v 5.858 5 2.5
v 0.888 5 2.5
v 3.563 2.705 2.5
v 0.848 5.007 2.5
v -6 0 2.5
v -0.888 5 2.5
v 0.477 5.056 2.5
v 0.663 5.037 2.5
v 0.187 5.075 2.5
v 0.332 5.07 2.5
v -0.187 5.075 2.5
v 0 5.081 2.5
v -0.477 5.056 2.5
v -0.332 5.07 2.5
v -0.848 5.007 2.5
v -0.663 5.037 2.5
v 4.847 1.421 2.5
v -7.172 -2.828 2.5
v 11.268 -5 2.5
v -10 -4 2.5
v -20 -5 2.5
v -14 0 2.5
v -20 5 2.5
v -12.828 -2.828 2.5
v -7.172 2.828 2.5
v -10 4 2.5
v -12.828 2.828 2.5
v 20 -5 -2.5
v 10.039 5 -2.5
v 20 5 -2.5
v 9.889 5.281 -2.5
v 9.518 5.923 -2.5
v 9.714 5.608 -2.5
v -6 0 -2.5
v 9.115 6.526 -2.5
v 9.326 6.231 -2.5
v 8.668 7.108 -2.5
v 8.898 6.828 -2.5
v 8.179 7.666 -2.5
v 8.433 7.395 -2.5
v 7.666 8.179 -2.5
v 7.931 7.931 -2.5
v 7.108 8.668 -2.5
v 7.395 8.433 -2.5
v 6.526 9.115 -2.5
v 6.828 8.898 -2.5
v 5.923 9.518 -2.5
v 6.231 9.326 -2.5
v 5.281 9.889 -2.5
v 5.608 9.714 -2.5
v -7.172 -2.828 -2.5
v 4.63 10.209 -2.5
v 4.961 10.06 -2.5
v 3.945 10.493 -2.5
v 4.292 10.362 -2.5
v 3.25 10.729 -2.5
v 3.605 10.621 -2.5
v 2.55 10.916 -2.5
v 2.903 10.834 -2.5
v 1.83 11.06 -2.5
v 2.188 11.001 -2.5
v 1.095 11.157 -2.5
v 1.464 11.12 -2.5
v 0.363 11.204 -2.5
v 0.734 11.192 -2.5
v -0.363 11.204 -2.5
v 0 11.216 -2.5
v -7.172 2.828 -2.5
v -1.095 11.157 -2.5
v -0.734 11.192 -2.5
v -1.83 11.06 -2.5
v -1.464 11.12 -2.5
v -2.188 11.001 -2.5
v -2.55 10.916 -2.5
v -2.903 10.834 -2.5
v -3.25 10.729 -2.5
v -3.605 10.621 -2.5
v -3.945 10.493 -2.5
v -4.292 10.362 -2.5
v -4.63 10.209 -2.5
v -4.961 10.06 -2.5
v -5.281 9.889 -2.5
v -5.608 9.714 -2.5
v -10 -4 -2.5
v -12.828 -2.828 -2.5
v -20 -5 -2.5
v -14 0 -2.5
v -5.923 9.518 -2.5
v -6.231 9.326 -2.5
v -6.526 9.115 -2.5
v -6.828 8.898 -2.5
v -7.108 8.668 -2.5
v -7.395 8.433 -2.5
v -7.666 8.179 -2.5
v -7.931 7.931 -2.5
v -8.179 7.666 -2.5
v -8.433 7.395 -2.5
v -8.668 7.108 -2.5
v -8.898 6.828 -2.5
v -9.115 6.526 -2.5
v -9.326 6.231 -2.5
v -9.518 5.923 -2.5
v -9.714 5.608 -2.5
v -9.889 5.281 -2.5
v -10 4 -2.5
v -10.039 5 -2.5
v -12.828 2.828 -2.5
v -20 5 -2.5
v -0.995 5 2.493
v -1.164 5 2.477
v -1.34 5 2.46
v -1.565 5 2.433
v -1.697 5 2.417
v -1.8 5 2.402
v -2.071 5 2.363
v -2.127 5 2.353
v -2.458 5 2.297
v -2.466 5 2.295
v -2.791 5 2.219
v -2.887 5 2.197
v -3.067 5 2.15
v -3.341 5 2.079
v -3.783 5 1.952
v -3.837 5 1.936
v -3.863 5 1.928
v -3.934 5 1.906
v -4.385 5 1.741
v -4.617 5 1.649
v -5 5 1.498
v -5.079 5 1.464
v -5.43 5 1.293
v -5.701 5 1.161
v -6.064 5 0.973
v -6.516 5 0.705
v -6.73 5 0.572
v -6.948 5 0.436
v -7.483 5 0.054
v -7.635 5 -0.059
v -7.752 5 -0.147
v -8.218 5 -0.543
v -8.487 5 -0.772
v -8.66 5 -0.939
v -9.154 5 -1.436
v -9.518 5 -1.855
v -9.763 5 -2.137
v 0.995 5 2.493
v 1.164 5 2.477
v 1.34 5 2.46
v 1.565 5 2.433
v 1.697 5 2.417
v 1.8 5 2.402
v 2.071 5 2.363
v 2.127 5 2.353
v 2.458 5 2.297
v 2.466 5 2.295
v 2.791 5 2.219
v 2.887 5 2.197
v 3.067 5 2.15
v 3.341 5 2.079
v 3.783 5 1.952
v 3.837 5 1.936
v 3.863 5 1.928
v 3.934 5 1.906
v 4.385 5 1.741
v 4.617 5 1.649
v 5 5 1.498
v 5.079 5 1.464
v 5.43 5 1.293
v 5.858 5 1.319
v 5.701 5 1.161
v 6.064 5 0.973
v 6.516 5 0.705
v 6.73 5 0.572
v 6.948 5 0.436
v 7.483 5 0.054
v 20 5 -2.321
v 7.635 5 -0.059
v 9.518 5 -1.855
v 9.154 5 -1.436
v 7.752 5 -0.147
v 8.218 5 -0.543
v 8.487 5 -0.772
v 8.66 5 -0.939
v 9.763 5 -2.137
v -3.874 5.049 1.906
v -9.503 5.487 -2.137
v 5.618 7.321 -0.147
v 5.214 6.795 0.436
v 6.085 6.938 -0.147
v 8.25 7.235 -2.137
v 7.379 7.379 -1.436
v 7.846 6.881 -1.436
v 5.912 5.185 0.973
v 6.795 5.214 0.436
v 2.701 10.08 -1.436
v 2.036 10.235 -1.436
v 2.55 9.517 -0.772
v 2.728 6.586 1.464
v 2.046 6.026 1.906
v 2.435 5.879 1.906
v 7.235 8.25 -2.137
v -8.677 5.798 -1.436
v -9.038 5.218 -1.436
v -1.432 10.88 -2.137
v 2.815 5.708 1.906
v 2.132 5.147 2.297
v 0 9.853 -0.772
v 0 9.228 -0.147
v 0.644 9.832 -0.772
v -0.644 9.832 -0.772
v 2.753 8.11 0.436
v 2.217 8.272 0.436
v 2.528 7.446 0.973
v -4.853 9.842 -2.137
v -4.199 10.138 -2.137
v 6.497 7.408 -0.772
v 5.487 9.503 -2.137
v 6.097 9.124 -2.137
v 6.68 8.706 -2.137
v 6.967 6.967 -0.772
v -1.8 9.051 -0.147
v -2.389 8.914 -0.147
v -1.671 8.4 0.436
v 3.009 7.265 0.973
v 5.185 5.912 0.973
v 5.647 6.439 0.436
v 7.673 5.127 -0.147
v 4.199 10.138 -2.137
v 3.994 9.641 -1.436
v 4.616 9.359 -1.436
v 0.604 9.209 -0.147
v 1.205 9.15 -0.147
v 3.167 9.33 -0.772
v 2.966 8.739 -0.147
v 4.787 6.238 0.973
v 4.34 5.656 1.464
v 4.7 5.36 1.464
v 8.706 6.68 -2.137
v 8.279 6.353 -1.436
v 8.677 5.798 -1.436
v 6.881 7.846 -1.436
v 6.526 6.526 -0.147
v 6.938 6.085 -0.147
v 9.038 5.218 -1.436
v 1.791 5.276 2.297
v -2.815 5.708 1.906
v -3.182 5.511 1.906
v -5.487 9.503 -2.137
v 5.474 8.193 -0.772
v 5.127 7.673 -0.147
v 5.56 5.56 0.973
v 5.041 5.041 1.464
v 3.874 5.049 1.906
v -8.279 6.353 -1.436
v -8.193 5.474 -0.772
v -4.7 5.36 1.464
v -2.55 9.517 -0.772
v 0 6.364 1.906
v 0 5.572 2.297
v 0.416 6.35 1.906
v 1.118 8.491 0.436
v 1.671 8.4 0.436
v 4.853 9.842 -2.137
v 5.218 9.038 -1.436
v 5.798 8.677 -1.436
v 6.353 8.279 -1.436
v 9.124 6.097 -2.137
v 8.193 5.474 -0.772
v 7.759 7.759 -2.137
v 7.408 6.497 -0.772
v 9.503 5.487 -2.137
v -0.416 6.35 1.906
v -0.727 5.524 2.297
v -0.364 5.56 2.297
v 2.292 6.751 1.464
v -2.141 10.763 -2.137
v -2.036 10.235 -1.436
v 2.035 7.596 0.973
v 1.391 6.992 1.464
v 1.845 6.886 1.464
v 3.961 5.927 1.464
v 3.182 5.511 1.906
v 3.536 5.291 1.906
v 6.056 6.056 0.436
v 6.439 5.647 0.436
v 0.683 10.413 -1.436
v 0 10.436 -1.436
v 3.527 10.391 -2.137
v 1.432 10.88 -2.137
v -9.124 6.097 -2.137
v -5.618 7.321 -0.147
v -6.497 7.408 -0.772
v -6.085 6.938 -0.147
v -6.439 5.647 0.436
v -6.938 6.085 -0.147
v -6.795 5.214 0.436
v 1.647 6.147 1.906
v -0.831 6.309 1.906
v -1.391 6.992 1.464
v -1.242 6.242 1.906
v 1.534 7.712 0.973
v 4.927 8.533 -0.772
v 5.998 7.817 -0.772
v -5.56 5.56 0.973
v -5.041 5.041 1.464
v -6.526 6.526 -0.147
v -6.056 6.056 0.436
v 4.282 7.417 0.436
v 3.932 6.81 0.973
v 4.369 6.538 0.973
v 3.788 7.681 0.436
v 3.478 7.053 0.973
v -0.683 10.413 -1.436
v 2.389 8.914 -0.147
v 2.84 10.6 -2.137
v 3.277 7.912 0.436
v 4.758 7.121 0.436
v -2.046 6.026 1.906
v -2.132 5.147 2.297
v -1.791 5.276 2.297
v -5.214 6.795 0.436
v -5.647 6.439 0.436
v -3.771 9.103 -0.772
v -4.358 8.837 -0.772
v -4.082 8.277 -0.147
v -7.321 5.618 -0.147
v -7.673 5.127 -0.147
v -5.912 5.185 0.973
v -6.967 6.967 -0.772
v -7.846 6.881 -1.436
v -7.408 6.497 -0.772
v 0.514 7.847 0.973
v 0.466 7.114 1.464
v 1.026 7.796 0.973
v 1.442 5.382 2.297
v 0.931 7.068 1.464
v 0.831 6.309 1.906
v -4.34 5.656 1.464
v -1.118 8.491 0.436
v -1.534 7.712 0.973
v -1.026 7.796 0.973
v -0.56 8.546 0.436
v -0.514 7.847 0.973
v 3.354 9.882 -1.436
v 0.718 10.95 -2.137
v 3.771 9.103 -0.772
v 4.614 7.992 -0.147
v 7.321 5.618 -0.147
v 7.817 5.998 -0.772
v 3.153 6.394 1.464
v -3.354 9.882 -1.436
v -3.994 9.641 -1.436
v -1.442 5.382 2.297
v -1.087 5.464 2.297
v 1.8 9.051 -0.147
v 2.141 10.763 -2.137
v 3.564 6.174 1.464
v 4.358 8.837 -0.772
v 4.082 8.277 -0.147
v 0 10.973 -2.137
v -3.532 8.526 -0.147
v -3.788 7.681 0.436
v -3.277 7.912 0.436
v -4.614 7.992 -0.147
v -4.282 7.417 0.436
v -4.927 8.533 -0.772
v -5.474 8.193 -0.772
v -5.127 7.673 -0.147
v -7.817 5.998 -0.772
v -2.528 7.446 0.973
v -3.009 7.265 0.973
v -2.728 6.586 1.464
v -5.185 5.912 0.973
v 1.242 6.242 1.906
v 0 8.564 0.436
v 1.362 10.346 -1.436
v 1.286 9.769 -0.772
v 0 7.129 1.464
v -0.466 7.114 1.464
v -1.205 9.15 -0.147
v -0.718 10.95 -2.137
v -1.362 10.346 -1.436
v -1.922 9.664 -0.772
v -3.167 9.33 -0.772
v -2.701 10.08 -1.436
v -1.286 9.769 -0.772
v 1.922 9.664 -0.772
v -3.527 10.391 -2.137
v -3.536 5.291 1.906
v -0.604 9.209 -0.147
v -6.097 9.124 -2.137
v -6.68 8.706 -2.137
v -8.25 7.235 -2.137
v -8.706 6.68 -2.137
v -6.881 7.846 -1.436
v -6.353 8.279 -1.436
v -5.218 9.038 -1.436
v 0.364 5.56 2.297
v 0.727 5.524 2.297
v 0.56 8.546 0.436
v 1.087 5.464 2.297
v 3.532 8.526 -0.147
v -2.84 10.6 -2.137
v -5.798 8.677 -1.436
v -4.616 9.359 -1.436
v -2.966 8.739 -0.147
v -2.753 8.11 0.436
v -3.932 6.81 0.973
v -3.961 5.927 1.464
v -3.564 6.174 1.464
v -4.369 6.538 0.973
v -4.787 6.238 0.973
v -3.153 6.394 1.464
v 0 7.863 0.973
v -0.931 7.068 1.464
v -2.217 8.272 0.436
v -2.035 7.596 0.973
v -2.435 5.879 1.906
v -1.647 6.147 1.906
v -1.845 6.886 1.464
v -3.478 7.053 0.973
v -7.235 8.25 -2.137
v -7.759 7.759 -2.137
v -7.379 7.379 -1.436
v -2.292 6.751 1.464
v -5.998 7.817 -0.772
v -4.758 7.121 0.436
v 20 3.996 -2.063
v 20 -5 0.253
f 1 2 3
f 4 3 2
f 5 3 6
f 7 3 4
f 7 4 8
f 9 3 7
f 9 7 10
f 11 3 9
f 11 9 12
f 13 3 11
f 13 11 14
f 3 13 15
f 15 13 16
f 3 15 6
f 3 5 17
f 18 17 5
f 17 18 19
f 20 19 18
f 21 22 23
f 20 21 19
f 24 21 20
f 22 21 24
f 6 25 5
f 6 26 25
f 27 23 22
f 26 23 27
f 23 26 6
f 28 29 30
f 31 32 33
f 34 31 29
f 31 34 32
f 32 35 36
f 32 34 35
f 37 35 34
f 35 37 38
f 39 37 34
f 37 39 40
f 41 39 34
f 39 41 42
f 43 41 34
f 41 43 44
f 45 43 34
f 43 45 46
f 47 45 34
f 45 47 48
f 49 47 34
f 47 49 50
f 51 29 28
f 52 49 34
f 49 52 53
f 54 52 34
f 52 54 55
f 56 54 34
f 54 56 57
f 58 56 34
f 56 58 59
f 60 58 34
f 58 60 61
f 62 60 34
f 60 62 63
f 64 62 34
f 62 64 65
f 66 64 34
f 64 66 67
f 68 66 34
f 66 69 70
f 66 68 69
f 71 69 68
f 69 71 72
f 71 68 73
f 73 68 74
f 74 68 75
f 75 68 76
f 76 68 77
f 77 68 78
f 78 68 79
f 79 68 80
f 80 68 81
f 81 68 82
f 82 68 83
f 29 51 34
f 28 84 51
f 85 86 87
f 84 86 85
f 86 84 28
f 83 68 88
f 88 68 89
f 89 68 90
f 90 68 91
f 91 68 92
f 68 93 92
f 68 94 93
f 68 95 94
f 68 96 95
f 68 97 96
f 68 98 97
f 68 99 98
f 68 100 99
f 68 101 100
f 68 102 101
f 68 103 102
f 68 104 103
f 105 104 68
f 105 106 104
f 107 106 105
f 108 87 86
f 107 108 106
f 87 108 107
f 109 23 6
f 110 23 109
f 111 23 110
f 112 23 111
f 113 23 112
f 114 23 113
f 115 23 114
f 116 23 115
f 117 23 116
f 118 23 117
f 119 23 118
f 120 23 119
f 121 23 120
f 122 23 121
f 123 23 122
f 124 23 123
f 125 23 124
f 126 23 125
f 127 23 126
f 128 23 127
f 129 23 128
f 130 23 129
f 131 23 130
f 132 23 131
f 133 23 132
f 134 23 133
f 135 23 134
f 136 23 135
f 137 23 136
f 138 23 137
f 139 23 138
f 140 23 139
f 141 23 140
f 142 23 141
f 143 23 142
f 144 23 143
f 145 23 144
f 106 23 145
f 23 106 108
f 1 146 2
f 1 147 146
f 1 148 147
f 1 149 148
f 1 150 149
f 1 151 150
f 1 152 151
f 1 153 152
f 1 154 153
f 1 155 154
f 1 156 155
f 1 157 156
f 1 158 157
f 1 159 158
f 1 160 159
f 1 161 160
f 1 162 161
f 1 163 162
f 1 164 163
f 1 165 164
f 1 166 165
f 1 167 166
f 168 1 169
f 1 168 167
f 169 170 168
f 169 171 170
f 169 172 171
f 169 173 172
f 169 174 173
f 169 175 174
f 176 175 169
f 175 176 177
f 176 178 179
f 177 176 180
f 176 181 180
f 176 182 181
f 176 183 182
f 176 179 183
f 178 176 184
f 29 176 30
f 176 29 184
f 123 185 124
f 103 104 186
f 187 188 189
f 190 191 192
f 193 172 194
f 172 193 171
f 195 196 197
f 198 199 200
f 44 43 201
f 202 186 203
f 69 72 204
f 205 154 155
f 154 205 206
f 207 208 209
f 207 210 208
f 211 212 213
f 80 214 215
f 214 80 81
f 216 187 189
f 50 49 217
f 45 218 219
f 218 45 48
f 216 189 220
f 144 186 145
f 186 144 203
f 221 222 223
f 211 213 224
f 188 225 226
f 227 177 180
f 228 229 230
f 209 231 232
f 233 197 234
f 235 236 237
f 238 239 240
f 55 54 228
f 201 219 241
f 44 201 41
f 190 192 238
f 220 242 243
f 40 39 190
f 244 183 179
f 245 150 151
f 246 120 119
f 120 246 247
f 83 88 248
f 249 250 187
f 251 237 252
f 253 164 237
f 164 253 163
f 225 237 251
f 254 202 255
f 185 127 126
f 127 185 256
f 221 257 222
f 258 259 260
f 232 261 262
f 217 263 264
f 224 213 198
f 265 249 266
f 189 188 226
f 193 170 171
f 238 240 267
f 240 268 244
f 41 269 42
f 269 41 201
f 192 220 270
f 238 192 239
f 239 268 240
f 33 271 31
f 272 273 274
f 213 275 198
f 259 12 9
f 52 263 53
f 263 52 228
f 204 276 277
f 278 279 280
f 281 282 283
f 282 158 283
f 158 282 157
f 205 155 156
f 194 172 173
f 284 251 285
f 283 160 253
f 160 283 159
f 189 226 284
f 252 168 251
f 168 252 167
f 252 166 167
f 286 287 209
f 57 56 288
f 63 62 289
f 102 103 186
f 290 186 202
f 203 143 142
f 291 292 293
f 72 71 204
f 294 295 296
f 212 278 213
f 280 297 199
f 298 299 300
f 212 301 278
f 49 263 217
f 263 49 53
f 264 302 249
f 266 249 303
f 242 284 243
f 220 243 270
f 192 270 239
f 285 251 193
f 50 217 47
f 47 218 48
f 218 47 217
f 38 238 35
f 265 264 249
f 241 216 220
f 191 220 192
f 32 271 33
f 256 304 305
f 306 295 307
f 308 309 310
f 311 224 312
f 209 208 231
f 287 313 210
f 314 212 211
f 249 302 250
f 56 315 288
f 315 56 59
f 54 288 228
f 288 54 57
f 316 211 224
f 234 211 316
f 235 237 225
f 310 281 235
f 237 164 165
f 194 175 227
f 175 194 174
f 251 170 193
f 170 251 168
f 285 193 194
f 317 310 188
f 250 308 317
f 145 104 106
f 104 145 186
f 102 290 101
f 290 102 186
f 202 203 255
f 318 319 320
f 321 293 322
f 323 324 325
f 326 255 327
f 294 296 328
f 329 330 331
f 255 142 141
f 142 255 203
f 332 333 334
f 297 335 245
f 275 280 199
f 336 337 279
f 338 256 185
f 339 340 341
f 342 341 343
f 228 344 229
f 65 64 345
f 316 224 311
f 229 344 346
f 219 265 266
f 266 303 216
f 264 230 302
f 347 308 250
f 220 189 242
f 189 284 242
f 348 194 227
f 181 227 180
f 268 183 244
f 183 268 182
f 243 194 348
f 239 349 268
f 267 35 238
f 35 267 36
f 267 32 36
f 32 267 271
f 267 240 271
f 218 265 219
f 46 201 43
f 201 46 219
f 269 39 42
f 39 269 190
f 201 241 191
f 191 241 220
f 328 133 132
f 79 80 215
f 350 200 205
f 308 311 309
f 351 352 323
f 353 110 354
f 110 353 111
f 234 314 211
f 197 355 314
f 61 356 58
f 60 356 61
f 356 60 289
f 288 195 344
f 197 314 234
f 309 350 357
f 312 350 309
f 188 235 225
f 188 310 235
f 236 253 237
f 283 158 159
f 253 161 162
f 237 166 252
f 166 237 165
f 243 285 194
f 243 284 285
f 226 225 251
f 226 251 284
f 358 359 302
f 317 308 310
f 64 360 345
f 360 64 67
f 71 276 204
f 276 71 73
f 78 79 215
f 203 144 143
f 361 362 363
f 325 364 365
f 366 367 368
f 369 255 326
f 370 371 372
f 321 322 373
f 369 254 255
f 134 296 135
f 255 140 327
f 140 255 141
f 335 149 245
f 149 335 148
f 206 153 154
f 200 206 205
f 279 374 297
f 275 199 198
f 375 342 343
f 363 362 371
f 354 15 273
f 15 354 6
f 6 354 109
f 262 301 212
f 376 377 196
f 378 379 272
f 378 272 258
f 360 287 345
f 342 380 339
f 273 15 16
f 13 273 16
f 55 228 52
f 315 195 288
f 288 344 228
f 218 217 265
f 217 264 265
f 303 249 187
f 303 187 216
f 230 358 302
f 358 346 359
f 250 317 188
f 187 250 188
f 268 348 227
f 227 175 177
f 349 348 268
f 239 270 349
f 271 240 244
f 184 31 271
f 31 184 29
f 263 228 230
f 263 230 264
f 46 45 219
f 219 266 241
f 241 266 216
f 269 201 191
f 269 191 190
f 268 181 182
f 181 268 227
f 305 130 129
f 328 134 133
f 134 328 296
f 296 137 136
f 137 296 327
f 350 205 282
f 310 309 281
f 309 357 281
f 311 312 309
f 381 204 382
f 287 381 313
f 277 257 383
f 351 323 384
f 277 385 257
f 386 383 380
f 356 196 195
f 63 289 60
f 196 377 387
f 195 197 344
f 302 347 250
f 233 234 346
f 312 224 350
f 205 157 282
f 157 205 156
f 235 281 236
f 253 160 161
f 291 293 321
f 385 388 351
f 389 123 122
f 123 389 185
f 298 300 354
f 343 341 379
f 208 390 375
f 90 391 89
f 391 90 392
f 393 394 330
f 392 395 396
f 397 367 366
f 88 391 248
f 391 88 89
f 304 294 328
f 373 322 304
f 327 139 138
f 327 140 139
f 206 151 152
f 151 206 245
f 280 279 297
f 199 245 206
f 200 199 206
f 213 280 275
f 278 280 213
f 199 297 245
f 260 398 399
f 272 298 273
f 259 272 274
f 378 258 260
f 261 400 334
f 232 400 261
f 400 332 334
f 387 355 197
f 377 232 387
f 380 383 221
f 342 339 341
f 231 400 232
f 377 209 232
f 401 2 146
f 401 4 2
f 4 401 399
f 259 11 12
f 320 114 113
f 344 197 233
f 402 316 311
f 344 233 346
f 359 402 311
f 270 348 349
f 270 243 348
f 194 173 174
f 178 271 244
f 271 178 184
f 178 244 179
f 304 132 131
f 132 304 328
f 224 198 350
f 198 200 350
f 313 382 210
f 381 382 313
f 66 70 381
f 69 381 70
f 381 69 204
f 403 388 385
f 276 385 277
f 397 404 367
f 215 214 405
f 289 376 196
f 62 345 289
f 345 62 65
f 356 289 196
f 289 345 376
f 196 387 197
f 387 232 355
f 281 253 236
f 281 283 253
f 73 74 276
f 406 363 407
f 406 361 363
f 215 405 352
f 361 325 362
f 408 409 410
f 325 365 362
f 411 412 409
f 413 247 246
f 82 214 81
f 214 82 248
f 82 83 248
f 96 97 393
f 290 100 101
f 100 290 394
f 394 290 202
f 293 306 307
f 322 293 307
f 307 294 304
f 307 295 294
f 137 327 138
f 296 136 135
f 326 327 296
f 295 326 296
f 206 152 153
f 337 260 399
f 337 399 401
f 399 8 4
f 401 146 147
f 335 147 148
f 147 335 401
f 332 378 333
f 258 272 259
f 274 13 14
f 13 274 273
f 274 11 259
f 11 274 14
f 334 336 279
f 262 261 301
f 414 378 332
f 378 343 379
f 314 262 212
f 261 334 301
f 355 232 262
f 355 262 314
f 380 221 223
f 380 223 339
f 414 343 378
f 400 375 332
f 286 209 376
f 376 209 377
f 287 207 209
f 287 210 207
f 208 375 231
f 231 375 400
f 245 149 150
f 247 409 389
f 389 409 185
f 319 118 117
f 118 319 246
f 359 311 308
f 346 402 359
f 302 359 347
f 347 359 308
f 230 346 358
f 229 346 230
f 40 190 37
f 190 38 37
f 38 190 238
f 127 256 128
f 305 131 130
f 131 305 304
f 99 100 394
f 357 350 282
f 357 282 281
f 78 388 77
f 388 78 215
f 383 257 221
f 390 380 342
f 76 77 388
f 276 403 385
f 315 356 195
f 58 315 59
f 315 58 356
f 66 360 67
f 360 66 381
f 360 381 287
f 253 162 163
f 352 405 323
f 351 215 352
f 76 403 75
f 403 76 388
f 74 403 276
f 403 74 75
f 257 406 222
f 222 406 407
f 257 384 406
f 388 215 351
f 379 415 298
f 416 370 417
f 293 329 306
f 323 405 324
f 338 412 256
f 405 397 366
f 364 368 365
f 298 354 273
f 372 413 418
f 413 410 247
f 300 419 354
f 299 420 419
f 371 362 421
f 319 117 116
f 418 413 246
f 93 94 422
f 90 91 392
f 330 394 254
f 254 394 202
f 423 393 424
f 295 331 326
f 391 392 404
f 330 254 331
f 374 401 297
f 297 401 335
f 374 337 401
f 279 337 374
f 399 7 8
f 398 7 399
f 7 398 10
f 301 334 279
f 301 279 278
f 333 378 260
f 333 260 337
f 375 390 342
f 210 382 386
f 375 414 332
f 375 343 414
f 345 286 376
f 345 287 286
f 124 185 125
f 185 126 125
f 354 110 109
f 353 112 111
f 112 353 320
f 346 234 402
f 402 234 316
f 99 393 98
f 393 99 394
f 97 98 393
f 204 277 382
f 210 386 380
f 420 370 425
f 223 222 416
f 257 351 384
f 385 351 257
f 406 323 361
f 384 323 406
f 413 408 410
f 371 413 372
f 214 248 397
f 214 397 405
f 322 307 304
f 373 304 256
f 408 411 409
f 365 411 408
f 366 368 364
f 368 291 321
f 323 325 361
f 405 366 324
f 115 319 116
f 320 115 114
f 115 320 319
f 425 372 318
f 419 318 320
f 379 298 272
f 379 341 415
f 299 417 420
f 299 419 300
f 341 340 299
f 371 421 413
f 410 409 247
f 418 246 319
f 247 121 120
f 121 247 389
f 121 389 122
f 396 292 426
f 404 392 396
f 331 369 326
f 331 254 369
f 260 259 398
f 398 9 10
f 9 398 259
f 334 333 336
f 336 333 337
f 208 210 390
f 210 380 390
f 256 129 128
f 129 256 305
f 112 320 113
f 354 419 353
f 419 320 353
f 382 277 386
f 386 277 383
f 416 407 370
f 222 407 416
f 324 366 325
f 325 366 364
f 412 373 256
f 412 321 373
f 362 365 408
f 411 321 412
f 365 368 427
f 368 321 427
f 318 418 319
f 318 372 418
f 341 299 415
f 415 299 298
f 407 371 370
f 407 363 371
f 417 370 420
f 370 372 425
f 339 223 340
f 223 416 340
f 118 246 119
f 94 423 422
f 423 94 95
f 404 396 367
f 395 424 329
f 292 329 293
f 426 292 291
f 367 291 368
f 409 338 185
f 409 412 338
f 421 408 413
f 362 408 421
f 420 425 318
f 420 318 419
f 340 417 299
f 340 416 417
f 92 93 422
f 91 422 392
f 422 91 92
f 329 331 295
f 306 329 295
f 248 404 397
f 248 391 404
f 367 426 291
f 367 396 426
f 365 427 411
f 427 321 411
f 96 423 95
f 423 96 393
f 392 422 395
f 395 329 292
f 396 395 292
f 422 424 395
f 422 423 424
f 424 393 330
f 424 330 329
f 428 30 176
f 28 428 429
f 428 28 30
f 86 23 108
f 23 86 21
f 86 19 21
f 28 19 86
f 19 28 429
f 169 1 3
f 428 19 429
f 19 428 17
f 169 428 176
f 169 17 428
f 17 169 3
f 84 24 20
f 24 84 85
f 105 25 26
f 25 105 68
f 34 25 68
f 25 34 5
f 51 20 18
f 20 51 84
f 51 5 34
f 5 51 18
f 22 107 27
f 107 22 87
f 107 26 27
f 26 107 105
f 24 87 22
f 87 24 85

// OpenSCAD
$fn = 96;


difference() {
	union() {
		cube([40,10,5], center=true);
		intersection() {
			translate(v=[0,15,0]) cube([30,20,5], center=true);
			translate(v=[0,0,-10]) sphere(r=13.5);
		}
	}
	translate(v=[20,5,3]) rotate(a=[0,20,45]) cube([30,20,10], center=true);
	translate(v=[-10,0,-10]) cylinder(r=4,h=20, $fn=8);
}
